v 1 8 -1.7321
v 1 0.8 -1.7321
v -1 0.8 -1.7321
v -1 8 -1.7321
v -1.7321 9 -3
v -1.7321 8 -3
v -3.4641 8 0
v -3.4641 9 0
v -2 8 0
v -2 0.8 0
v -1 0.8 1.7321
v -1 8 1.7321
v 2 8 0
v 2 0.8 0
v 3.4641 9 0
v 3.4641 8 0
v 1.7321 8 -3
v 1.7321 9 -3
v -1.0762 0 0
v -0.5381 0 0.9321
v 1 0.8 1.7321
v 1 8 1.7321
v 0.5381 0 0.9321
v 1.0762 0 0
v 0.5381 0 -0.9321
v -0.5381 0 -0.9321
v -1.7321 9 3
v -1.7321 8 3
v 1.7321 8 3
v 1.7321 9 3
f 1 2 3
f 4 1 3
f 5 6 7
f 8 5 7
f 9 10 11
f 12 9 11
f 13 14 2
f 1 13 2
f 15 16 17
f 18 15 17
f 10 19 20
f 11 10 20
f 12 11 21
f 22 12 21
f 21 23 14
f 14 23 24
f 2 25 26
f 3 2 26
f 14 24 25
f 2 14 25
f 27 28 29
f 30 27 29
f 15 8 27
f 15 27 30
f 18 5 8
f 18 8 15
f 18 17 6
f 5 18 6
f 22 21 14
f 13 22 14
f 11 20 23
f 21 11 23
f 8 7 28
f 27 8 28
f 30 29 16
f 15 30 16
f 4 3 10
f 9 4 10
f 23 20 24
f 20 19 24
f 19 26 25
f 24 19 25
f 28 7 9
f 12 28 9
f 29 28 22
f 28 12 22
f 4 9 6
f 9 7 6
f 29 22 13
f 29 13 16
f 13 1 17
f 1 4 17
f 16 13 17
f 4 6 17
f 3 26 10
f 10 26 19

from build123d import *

# Parameters (mm, degrees)
BOSS_EXTRUDE1_DEPTH = 8
CHAMFER2_SIZE       = 0.8
BOSS_EXTRUDE2_DEPTH = 1


with BuildPart() as part:
    # Sketch1 → Boss-Extrude1 (new body)
    with BuildSketch(Plane(origin=(0, 0, 0), x_dir=(1, 0, 0), z_dir=(0, 1, 0))):
        Polygon((2, 0), (1, 1.732050808), (-1, 1.732050808), (-2, 0), (-1, -1.732050808), (1, -1.732050808), align=None)
    extrude(amount=BOSS_EXTRUDE1_DEPTH)

    # Chamfer2
    chamfer2_edges = [part.edges().sort_by_distance(p)[0] for p in [
        (0, 0, 1.732050808),
        (-1.5, 0, 0.866025404),
        (-1.5, 0, -0.866025404),
        (0, 0, -1.732050808),
        (1.5, 0, -0.866025404),
        (1.5, 0, 0.866025404),
    ]]
    chamfer(chamfer2_edges, length=CHAMFER2_SIZE)

    # Sketch2 → Boss-Extrude2 (add)
    with BuildSketch(Plane(origin=(0, 8, 0), x_dir=(1, 0, 0), z_dir=(0, 1, 0))):
        Polygon((-3.464101615, 0), (-1.732050808, -3), (1.732050808, -3), (3.464101615, 0), (1.732050808, 3), (-1.732050808, 3), align=None)
    extrude(amount=BOSS_EXTRUDE2_DEPTH)


solid = part.part
